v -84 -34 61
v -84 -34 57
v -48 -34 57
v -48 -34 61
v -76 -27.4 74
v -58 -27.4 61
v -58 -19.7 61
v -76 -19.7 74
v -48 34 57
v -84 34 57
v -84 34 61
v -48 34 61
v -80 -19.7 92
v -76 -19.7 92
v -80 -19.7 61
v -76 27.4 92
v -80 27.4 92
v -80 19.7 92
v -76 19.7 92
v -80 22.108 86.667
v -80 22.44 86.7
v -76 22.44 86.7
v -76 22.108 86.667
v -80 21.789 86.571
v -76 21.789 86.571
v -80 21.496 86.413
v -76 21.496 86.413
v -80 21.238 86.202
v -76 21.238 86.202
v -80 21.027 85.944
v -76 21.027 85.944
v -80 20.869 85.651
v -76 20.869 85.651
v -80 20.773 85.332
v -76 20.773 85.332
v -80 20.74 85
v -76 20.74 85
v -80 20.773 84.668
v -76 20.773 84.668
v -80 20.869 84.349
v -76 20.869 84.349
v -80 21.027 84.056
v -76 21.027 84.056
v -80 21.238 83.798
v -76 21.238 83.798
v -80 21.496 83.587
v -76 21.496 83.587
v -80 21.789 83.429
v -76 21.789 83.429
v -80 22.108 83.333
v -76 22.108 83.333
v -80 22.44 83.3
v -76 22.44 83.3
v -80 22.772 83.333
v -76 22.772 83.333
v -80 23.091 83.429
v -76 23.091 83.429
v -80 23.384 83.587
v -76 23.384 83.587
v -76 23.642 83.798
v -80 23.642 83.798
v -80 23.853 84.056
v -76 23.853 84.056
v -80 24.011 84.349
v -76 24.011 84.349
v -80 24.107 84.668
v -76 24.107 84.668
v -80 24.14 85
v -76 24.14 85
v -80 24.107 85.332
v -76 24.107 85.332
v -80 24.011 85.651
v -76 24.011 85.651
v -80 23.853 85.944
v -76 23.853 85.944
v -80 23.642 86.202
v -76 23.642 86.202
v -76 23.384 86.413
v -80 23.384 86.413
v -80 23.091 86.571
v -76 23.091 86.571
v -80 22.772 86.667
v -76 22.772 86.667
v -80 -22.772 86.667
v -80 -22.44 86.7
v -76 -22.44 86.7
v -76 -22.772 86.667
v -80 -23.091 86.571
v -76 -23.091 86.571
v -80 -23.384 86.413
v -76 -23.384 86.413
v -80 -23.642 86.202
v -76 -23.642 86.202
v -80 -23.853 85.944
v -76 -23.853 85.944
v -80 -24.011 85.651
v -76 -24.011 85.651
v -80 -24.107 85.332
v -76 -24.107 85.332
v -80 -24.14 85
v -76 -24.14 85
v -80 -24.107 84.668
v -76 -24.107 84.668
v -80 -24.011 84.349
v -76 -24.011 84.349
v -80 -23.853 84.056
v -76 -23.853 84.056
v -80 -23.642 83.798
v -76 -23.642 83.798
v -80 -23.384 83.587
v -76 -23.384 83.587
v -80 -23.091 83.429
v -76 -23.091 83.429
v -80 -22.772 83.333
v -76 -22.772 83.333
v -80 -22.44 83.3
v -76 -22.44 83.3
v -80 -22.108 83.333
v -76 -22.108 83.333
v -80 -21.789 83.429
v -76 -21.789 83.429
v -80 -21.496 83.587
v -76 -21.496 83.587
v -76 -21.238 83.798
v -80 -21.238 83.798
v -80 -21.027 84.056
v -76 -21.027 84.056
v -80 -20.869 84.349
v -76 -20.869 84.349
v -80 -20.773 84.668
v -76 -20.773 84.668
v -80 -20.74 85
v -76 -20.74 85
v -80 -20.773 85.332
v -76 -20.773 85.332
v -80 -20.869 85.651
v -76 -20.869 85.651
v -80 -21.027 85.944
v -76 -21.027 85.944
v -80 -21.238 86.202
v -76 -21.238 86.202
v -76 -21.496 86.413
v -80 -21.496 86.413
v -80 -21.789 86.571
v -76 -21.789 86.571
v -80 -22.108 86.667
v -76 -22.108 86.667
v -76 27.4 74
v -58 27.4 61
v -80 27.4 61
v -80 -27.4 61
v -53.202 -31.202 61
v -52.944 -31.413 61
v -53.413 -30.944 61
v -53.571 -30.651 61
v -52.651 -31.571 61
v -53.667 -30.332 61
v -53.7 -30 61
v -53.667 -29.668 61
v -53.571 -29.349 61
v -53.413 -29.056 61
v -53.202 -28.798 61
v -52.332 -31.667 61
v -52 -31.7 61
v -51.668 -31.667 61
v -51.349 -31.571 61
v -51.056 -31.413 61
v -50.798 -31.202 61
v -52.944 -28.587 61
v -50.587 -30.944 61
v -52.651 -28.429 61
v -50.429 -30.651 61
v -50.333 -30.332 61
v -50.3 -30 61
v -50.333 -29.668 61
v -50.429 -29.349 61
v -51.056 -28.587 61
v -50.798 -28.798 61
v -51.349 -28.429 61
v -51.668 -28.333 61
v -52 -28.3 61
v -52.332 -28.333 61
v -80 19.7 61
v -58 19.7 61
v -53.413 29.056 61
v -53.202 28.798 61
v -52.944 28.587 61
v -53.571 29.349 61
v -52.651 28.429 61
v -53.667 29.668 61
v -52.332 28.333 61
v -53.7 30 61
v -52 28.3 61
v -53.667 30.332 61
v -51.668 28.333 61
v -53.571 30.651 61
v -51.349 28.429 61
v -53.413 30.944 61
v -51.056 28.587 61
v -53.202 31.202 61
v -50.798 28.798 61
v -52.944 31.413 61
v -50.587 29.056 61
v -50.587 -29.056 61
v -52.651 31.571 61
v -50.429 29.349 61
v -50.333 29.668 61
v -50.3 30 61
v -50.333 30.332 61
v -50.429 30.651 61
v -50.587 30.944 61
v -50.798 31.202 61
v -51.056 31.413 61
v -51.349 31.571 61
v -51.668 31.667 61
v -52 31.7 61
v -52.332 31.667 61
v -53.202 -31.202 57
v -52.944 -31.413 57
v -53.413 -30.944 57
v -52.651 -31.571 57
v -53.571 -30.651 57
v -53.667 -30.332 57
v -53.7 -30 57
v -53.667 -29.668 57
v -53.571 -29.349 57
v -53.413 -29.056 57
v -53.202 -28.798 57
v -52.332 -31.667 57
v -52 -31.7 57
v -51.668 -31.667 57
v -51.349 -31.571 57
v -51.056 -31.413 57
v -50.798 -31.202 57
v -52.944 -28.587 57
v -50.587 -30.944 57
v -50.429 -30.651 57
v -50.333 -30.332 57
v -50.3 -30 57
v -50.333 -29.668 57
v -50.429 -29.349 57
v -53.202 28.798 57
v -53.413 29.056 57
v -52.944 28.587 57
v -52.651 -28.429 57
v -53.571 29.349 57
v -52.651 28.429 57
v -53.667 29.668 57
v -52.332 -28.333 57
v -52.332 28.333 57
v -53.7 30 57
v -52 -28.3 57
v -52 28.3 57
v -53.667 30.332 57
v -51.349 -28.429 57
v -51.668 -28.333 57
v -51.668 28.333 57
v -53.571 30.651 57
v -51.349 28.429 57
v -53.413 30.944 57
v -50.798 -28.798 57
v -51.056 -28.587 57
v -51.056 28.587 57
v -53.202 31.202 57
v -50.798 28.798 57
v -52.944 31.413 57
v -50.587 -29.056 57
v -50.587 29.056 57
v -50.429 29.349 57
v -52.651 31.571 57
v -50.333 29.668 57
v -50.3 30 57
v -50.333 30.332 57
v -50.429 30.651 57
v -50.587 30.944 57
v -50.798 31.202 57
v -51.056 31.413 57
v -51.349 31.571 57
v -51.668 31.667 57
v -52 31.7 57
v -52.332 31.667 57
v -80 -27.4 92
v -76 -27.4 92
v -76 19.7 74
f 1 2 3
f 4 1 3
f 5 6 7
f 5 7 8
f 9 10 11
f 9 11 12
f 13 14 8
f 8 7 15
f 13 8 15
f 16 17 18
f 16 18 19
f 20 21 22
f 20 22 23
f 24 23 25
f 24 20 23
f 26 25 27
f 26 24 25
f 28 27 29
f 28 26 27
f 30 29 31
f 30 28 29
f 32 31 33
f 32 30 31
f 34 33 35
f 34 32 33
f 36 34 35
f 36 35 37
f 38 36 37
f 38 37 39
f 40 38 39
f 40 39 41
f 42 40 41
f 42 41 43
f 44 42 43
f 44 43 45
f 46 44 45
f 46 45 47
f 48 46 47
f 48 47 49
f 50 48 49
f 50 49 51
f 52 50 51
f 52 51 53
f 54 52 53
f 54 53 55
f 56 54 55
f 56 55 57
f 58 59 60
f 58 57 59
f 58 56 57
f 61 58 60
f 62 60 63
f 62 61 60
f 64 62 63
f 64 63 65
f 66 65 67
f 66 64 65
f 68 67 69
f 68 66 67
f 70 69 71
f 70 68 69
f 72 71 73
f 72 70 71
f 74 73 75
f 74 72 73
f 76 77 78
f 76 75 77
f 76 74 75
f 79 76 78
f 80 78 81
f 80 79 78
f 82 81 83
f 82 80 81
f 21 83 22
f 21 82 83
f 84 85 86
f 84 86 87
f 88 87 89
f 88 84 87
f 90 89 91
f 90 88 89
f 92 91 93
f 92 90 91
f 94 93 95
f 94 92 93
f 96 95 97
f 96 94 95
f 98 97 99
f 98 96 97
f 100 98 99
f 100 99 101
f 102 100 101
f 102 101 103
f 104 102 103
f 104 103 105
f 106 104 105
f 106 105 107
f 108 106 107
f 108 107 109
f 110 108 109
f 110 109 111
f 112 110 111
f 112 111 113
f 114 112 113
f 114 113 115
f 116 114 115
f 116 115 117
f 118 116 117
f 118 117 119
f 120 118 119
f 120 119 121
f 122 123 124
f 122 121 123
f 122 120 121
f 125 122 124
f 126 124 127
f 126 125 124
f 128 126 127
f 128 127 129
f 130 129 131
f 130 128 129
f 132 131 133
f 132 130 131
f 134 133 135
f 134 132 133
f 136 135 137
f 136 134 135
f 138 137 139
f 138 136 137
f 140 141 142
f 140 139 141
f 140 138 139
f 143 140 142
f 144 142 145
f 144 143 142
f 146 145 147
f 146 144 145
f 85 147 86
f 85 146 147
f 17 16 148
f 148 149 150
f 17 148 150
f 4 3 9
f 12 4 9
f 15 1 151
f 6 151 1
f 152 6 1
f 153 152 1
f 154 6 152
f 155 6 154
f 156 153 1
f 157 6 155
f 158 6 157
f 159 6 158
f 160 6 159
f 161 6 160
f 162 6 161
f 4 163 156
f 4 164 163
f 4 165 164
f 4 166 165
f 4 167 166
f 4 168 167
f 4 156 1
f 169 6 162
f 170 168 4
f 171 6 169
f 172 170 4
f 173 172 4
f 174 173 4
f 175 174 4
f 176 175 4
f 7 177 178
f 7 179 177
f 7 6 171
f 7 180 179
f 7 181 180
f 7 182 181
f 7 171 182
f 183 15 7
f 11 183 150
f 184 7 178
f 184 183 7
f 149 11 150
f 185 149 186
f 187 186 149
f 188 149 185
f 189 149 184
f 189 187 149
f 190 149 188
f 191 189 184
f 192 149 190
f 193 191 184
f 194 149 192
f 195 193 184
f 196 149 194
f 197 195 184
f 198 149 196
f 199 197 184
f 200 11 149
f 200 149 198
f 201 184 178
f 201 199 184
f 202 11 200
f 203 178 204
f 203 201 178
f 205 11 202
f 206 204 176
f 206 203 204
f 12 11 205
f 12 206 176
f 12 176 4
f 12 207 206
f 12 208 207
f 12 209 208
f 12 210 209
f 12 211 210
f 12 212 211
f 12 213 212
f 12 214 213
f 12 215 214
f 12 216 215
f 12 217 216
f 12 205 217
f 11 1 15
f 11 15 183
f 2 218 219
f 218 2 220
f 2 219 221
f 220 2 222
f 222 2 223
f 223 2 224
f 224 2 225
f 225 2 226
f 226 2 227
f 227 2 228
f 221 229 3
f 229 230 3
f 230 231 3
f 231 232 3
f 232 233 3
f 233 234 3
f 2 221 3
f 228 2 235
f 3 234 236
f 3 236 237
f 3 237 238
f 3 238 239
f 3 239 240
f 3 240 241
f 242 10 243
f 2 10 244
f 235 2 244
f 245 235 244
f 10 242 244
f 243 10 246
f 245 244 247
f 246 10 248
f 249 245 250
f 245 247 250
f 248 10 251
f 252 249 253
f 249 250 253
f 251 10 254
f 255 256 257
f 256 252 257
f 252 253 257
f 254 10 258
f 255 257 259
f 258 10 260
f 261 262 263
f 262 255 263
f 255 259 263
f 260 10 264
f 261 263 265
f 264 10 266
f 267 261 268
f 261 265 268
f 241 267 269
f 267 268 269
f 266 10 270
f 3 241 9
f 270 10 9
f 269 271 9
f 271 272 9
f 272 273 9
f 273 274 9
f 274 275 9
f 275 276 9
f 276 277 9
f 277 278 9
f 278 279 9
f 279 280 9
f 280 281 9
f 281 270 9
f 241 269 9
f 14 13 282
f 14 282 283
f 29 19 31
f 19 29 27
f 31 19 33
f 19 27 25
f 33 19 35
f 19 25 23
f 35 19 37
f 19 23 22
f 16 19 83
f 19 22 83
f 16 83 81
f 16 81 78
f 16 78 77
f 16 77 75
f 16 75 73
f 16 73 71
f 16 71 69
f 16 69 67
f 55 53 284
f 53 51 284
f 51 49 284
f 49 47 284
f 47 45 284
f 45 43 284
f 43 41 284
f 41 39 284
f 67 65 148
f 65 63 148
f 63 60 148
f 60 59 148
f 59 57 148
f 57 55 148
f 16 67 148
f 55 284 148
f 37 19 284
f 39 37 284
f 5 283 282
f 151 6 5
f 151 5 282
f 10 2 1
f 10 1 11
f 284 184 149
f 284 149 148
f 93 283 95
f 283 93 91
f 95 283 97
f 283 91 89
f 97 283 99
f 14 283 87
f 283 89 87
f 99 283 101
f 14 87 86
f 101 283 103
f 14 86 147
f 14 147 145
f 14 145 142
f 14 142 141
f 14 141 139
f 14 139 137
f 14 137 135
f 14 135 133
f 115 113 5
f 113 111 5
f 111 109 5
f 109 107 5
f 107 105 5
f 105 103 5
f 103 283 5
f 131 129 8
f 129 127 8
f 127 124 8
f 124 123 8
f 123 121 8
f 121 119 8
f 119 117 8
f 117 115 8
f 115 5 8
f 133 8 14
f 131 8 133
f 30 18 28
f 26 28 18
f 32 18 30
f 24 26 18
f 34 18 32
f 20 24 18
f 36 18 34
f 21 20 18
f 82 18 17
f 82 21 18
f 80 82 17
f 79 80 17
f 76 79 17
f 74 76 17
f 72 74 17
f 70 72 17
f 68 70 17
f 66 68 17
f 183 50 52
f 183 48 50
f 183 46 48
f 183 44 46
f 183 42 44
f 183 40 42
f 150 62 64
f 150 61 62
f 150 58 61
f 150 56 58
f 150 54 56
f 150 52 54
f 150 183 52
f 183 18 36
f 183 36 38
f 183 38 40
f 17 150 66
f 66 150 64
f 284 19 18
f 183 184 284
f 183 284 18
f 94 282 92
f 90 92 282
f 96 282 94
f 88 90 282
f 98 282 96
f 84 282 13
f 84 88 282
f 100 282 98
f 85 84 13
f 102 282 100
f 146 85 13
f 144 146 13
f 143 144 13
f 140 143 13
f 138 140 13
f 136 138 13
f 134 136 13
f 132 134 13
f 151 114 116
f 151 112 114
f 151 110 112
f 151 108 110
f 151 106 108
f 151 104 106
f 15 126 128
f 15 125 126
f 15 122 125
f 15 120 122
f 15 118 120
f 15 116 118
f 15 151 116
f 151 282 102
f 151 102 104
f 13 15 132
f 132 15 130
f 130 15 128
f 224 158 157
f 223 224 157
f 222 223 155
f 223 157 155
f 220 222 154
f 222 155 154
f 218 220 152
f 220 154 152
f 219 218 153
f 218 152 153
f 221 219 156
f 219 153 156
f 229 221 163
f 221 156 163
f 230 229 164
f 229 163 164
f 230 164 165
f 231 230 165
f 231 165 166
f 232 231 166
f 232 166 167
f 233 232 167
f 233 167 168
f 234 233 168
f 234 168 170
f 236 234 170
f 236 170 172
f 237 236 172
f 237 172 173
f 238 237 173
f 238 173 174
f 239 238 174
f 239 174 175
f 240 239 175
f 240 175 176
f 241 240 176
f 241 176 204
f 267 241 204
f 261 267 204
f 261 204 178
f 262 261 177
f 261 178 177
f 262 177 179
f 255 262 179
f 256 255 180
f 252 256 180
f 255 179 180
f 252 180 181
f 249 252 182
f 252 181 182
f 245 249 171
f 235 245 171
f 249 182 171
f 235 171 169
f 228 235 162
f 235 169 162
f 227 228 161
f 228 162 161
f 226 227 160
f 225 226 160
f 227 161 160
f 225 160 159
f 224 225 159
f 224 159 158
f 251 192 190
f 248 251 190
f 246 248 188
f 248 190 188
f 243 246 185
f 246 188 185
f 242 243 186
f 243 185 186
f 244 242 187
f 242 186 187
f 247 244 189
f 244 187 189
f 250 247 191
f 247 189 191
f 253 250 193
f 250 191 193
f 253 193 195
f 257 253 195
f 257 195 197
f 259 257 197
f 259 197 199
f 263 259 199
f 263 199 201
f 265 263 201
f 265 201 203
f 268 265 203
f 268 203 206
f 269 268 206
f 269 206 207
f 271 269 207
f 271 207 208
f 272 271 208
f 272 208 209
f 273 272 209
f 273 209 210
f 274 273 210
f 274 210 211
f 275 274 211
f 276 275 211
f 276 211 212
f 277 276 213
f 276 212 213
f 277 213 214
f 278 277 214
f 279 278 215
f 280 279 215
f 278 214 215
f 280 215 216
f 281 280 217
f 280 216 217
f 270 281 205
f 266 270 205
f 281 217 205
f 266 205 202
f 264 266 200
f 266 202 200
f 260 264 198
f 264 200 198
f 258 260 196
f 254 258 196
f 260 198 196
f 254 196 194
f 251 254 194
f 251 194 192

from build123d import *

# Parameters (mm, degrees)
BASE_4MM_START                          = 57
SKETCH_7_W                              = 36
SKETCH_7_H                              = 68
BASE_4MM_DEPTH                          = 4
TWIN_EAR_SUPPORTS_START                 = 61
SKETCH_8_W                              = 4
SKETCH_8_H                              = 7.7
TWIN_EAR_SUPPORTS_DEPTH                 = 31
INTEGRAL_SHORT_GUSSET_27_4_START        = -27.4
INTEGRAL_SHORT_GUSSET_27_4_DEPTH        = 7.7
INTEGRAL_SHORT_GUSSET_19_7_START        = 19.7
INTEGRAL_SHORT_GUSSET_19_7_DEPTH        = 7.7
BASE_M3_CLEARANCE_START                 = 63
SKETCH_11_R                             = 1.7
BASE_M3_CLEARANCE_DEPTH                 = 7
ACTUAL_CAMERA_44P88_PITCH_M3_DEPTH      = 120
ACTUAL_CAMERA_44P88_PITCH_M3_DEPTH_BACK = 120
SKETCH_12_R                             = 1.7


with BuildPart() as part:
    # 草图7 → Base_4mm (new body)
    with BuildSketch(Plane.XY.offset(BASE_4MM_START)):
        with Locations((-66, 0)):
            Rectangle(SKETCH_7_W, SKETCH_7_H)
    extrude(amount=BASE_4MM_DEPTH)

    # 草图8 → Twin_ear_supports (add)
    with BuildSketch(Plane.XY.offset(TWIN_EAR_SUPPORTS_START)):
        with Locations((-78, -23.55)):
            Rectangle(SKETCH_8_W, SKETCH_8_H)
        with Locations((-78, 23.55)):
            Rectangle(SKETCH_8_W, SKETCH_8_H)
    extrude(amount=TWIN_EAR_SUPPORTS_DEPTH)

    # 草图9 → Integral_short_gusset_-27.4 (add)
    with BuildSketch(Plane(origin=(0, 0, 0), x_dir=(1, 0, 0), z_dir=(0, 1, 0)).offset(INTEGRAL_SHORT_GUSSET_27_4_START)):
        Polygon((-76, -61), (-58, -61), (-76, -74), align=None)
    extrude(amount=INTEGRAL_SHORT_GUSSET_27_4_DEPTH)

    # 草图10 → Integral_short_gusset_19.7 (add)
    with BuildSketch(Plane(origin=(0, 0, 0), x_dir=(1, 0, 0), z_dir=(0, 1, 0)).offset(INTEGRAL_SHORT_GUSSET_19_7_START)):
        Polygon((-76, -61), (-58, -61), (-76, -74), align=None)
    extrude(amount=INTEGRAL_SHORT_GUSSET_19_7_DEPTH)

    # 草图11 → Base_M3_clearance (cut)
    with BuildSketch(Plane.XY.offset(BASE_M3_CLEARANCE_START)):
        with Locations((-52, -30)):
            Circle(SKETCH_11_R)
        with Locations((-52, 30)):
            Circle(SKETCH_11_R)
    extrude(amount=-BASE_M3_CLEARANCE_DEPTH, mode=Mode.SUBTRACT)

    # 草图12 → Actual_camera_44p88_pitch_M3 (cut, two sides: drawn at the far end of the back side and taken through both)
    with BuildSketch(Plane(origin=(0, 0, 0), x_dir=(0, 0, -1), z_dir=(1, 0, 0)).offset(-ACTUAL_CAMERA_44P88_PITCH_M3_DEPTH_BACK)):
        with Locations((-85, -22.44)):
            Circle(SKETCH_12_R)
        with Locations((-85, 22.44)):
            Circle(SKETCH_12_R)
    extrude(amount=ACTUAL_CAMERA_44P88_PITCH_M3_DEPTH + ACTUAL_CAMERA_44P88_PITCH_M3_DEPTH_BACK, mode=Mode.SUBTRACT)


solid = part.part
